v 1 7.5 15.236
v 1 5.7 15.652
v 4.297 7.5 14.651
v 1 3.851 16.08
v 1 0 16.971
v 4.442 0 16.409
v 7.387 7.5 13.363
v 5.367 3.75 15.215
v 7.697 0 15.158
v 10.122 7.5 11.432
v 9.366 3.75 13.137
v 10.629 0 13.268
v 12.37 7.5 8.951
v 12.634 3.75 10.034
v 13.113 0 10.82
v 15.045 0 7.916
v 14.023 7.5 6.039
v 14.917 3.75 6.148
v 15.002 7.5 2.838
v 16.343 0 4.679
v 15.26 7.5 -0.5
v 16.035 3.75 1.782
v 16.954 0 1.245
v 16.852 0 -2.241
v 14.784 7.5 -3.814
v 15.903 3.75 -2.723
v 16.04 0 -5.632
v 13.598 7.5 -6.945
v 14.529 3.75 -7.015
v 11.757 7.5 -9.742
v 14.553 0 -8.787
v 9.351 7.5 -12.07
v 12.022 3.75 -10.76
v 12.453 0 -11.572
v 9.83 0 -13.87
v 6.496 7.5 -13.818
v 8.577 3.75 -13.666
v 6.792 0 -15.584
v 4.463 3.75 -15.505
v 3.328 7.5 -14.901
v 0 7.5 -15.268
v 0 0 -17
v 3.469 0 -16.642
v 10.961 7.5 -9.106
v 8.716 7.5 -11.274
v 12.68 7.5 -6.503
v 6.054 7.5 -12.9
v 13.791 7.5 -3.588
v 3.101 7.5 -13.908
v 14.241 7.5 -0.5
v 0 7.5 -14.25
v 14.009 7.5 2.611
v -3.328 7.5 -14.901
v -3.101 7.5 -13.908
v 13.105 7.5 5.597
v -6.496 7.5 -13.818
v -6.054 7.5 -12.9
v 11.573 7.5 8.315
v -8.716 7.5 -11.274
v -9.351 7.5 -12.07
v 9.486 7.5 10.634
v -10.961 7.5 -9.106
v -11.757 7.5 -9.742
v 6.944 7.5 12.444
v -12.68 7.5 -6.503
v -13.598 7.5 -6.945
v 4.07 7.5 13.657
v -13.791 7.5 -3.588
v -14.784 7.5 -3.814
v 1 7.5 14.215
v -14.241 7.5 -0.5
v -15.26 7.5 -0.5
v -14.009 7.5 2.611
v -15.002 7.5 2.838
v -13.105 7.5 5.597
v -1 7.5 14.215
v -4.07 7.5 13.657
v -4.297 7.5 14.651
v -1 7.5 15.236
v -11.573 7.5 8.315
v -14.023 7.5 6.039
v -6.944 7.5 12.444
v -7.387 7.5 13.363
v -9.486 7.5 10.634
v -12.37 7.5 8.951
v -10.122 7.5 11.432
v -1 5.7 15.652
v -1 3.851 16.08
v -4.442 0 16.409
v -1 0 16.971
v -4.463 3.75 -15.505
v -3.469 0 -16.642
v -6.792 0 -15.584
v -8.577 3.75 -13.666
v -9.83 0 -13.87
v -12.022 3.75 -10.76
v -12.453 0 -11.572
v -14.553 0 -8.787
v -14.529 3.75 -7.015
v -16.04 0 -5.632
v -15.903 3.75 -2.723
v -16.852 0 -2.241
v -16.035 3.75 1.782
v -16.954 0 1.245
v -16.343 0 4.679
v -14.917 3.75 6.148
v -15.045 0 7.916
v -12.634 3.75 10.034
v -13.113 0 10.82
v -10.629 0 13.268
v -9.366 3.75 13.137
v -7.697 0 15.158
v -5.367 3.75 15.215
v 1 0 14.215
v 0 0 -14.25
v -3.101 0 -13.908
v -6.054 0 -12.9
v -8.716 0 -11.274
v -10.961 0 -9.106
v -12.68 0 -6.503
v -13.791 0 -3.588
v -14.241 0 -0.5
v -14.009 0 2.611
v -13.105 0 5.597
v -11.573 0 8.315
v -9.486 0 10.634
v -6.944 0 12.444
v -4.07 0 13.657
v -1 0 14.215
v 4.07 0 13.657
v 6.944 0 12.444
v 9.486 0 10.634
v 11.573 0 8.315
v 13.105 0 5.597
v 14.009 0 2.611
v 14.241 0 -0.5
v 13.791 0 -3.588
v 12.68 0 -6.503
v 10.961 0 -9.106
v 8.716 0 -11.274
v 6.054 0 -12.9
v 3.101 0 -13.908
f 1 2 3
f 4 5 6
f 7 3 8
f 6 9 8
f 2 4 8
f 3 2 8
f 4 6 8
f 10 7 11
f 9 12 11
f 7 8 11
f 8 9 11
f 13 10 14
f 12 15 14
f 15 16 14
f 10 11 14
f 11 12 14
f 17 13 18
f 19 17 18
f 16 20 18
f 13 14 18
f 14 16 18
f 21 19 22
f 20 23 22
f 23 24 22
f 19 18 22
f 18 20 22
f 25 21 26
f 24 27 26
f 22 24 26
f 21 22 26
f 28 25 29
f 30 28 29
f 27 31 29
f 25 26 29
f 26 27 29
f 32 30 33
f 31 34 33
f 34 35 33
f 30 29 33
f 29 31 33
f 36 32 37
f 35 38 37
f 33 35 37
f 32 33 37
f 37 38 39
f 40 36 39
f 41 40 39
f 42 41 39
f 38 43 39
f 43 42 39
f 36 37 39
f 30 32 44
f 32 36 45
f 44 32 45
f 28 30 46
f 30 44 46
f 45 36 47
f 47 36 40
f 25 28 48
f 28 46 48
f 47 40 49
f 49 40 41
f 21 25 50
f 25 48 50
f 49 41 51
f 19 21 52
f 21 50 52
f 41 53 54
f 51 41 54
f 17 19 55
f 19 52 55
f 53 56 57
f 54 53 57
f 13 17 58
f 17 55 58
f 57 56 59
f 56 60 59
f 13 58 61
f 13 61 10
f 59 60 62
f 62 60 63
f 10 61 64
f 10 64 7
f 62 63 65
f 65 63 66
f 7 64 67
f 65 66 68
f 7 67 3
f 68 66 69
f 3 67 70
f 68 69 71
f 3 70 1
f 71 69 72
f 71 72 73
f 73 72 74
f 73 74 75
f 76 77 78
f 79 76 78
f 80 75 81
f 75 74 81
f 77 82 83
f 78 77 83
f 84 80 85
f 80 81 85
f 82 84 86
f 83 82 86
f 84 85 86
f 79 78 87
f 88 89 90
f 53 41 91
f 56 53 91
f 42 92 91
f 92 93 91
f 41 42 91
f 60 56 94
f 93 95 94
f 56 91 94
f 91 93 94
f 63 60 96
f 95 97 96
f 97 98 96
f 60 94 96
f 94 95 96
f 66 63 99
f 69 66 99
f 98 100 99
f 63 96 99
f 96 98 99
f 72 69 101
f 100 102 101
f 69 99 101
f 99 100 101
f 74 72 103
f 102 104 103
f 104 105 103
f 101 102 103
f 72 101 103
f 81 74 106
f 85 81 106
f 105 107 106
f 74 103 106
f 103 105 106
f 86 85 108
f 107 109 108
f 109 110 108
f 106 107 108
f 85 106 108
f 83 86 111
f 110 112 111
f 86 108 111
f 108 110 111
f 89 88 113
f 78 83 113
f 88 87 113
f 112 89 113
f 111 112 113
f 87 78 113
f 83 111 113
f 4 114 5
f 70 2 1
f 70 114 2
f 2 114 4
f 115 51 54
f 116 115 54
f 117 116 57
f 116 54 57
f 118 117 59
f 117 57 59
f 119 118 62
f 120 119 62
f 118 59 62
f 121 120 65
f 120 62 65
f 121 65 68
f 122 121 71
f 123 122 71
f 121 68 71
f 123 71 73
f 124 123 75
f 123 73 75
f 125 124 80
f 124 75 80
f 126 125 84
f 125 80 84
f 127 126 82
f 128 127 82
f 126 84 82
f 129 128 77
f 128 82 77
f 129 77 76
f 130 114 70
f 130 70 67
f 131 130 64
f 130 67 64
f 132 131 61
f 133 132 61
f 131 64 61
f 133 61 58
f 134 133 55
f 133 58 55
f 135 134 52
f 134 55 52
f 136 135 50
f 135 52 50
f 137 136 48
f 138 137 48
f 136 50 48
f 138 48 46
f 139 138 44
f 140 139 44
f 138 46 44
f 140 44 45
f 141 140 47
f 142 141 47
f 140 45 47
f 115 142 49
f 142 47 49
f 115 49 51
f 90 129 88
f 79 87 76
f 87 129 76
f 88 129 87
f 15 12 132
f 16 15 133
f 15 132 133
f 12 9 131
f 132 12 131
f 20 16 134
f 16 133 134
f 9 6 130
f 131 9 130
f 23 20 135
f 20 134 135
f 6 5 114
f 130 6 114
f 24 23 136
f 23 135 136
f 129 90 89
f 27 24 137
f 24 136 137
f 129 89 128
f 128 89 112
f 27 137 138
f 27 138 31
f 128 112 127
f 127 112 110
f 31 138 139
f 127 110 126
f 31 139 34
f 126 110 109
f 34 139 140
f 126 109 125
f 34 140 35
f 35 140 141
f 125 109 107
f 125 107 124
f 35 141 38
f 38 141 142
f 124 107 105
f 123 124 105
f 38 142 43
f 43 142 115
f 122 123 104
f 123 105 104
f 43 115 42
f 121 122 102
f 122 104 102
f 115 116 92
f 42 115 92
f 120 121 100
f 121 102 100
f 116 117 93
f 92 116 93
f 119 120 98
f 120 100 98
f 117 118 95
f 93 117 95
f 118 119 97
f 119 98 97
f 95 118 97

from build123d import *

# Parameters (mm, degrees)
ESQUISSE2_W             = 2
ESQUISSE2_H             = 7.5
ENL_V_MAT_EXTRU_4_DEPTH = 18


with BuildPart() as part:
    # Esquisse1 → Révolution1 (revolve)
    with BuildSketch(Plane.XY, mode=Mode.PRIVATE) as r_volution1_sk:
        Polygon((14.25, 0), (14.25, 7.5), (15.268488567, 7.5), (17, 0), align=None)
    revolve(r_volution1_sk.sketch.rotate(Axis((0, -11.232892416, 0), (0, 1, 0)), 90), axis=Axis((0, -11.232892416, 0), (0, 1, 0)))  # turned: the seam where the file's is

    # Esquisse2 → Enlèv. mat.-Extru.4 (cut, through all)
    with BuildSketch(Plane.XY):
        with Locations((0, 3.75)):
            Rectangle(ESQUISSE2_W, ESQUISSE2_H)
    extrude(amount=ENL_V_MAT_EXTRU_4_DEPTH, mode=Mode.SUBTRACT)


solid = part.part
